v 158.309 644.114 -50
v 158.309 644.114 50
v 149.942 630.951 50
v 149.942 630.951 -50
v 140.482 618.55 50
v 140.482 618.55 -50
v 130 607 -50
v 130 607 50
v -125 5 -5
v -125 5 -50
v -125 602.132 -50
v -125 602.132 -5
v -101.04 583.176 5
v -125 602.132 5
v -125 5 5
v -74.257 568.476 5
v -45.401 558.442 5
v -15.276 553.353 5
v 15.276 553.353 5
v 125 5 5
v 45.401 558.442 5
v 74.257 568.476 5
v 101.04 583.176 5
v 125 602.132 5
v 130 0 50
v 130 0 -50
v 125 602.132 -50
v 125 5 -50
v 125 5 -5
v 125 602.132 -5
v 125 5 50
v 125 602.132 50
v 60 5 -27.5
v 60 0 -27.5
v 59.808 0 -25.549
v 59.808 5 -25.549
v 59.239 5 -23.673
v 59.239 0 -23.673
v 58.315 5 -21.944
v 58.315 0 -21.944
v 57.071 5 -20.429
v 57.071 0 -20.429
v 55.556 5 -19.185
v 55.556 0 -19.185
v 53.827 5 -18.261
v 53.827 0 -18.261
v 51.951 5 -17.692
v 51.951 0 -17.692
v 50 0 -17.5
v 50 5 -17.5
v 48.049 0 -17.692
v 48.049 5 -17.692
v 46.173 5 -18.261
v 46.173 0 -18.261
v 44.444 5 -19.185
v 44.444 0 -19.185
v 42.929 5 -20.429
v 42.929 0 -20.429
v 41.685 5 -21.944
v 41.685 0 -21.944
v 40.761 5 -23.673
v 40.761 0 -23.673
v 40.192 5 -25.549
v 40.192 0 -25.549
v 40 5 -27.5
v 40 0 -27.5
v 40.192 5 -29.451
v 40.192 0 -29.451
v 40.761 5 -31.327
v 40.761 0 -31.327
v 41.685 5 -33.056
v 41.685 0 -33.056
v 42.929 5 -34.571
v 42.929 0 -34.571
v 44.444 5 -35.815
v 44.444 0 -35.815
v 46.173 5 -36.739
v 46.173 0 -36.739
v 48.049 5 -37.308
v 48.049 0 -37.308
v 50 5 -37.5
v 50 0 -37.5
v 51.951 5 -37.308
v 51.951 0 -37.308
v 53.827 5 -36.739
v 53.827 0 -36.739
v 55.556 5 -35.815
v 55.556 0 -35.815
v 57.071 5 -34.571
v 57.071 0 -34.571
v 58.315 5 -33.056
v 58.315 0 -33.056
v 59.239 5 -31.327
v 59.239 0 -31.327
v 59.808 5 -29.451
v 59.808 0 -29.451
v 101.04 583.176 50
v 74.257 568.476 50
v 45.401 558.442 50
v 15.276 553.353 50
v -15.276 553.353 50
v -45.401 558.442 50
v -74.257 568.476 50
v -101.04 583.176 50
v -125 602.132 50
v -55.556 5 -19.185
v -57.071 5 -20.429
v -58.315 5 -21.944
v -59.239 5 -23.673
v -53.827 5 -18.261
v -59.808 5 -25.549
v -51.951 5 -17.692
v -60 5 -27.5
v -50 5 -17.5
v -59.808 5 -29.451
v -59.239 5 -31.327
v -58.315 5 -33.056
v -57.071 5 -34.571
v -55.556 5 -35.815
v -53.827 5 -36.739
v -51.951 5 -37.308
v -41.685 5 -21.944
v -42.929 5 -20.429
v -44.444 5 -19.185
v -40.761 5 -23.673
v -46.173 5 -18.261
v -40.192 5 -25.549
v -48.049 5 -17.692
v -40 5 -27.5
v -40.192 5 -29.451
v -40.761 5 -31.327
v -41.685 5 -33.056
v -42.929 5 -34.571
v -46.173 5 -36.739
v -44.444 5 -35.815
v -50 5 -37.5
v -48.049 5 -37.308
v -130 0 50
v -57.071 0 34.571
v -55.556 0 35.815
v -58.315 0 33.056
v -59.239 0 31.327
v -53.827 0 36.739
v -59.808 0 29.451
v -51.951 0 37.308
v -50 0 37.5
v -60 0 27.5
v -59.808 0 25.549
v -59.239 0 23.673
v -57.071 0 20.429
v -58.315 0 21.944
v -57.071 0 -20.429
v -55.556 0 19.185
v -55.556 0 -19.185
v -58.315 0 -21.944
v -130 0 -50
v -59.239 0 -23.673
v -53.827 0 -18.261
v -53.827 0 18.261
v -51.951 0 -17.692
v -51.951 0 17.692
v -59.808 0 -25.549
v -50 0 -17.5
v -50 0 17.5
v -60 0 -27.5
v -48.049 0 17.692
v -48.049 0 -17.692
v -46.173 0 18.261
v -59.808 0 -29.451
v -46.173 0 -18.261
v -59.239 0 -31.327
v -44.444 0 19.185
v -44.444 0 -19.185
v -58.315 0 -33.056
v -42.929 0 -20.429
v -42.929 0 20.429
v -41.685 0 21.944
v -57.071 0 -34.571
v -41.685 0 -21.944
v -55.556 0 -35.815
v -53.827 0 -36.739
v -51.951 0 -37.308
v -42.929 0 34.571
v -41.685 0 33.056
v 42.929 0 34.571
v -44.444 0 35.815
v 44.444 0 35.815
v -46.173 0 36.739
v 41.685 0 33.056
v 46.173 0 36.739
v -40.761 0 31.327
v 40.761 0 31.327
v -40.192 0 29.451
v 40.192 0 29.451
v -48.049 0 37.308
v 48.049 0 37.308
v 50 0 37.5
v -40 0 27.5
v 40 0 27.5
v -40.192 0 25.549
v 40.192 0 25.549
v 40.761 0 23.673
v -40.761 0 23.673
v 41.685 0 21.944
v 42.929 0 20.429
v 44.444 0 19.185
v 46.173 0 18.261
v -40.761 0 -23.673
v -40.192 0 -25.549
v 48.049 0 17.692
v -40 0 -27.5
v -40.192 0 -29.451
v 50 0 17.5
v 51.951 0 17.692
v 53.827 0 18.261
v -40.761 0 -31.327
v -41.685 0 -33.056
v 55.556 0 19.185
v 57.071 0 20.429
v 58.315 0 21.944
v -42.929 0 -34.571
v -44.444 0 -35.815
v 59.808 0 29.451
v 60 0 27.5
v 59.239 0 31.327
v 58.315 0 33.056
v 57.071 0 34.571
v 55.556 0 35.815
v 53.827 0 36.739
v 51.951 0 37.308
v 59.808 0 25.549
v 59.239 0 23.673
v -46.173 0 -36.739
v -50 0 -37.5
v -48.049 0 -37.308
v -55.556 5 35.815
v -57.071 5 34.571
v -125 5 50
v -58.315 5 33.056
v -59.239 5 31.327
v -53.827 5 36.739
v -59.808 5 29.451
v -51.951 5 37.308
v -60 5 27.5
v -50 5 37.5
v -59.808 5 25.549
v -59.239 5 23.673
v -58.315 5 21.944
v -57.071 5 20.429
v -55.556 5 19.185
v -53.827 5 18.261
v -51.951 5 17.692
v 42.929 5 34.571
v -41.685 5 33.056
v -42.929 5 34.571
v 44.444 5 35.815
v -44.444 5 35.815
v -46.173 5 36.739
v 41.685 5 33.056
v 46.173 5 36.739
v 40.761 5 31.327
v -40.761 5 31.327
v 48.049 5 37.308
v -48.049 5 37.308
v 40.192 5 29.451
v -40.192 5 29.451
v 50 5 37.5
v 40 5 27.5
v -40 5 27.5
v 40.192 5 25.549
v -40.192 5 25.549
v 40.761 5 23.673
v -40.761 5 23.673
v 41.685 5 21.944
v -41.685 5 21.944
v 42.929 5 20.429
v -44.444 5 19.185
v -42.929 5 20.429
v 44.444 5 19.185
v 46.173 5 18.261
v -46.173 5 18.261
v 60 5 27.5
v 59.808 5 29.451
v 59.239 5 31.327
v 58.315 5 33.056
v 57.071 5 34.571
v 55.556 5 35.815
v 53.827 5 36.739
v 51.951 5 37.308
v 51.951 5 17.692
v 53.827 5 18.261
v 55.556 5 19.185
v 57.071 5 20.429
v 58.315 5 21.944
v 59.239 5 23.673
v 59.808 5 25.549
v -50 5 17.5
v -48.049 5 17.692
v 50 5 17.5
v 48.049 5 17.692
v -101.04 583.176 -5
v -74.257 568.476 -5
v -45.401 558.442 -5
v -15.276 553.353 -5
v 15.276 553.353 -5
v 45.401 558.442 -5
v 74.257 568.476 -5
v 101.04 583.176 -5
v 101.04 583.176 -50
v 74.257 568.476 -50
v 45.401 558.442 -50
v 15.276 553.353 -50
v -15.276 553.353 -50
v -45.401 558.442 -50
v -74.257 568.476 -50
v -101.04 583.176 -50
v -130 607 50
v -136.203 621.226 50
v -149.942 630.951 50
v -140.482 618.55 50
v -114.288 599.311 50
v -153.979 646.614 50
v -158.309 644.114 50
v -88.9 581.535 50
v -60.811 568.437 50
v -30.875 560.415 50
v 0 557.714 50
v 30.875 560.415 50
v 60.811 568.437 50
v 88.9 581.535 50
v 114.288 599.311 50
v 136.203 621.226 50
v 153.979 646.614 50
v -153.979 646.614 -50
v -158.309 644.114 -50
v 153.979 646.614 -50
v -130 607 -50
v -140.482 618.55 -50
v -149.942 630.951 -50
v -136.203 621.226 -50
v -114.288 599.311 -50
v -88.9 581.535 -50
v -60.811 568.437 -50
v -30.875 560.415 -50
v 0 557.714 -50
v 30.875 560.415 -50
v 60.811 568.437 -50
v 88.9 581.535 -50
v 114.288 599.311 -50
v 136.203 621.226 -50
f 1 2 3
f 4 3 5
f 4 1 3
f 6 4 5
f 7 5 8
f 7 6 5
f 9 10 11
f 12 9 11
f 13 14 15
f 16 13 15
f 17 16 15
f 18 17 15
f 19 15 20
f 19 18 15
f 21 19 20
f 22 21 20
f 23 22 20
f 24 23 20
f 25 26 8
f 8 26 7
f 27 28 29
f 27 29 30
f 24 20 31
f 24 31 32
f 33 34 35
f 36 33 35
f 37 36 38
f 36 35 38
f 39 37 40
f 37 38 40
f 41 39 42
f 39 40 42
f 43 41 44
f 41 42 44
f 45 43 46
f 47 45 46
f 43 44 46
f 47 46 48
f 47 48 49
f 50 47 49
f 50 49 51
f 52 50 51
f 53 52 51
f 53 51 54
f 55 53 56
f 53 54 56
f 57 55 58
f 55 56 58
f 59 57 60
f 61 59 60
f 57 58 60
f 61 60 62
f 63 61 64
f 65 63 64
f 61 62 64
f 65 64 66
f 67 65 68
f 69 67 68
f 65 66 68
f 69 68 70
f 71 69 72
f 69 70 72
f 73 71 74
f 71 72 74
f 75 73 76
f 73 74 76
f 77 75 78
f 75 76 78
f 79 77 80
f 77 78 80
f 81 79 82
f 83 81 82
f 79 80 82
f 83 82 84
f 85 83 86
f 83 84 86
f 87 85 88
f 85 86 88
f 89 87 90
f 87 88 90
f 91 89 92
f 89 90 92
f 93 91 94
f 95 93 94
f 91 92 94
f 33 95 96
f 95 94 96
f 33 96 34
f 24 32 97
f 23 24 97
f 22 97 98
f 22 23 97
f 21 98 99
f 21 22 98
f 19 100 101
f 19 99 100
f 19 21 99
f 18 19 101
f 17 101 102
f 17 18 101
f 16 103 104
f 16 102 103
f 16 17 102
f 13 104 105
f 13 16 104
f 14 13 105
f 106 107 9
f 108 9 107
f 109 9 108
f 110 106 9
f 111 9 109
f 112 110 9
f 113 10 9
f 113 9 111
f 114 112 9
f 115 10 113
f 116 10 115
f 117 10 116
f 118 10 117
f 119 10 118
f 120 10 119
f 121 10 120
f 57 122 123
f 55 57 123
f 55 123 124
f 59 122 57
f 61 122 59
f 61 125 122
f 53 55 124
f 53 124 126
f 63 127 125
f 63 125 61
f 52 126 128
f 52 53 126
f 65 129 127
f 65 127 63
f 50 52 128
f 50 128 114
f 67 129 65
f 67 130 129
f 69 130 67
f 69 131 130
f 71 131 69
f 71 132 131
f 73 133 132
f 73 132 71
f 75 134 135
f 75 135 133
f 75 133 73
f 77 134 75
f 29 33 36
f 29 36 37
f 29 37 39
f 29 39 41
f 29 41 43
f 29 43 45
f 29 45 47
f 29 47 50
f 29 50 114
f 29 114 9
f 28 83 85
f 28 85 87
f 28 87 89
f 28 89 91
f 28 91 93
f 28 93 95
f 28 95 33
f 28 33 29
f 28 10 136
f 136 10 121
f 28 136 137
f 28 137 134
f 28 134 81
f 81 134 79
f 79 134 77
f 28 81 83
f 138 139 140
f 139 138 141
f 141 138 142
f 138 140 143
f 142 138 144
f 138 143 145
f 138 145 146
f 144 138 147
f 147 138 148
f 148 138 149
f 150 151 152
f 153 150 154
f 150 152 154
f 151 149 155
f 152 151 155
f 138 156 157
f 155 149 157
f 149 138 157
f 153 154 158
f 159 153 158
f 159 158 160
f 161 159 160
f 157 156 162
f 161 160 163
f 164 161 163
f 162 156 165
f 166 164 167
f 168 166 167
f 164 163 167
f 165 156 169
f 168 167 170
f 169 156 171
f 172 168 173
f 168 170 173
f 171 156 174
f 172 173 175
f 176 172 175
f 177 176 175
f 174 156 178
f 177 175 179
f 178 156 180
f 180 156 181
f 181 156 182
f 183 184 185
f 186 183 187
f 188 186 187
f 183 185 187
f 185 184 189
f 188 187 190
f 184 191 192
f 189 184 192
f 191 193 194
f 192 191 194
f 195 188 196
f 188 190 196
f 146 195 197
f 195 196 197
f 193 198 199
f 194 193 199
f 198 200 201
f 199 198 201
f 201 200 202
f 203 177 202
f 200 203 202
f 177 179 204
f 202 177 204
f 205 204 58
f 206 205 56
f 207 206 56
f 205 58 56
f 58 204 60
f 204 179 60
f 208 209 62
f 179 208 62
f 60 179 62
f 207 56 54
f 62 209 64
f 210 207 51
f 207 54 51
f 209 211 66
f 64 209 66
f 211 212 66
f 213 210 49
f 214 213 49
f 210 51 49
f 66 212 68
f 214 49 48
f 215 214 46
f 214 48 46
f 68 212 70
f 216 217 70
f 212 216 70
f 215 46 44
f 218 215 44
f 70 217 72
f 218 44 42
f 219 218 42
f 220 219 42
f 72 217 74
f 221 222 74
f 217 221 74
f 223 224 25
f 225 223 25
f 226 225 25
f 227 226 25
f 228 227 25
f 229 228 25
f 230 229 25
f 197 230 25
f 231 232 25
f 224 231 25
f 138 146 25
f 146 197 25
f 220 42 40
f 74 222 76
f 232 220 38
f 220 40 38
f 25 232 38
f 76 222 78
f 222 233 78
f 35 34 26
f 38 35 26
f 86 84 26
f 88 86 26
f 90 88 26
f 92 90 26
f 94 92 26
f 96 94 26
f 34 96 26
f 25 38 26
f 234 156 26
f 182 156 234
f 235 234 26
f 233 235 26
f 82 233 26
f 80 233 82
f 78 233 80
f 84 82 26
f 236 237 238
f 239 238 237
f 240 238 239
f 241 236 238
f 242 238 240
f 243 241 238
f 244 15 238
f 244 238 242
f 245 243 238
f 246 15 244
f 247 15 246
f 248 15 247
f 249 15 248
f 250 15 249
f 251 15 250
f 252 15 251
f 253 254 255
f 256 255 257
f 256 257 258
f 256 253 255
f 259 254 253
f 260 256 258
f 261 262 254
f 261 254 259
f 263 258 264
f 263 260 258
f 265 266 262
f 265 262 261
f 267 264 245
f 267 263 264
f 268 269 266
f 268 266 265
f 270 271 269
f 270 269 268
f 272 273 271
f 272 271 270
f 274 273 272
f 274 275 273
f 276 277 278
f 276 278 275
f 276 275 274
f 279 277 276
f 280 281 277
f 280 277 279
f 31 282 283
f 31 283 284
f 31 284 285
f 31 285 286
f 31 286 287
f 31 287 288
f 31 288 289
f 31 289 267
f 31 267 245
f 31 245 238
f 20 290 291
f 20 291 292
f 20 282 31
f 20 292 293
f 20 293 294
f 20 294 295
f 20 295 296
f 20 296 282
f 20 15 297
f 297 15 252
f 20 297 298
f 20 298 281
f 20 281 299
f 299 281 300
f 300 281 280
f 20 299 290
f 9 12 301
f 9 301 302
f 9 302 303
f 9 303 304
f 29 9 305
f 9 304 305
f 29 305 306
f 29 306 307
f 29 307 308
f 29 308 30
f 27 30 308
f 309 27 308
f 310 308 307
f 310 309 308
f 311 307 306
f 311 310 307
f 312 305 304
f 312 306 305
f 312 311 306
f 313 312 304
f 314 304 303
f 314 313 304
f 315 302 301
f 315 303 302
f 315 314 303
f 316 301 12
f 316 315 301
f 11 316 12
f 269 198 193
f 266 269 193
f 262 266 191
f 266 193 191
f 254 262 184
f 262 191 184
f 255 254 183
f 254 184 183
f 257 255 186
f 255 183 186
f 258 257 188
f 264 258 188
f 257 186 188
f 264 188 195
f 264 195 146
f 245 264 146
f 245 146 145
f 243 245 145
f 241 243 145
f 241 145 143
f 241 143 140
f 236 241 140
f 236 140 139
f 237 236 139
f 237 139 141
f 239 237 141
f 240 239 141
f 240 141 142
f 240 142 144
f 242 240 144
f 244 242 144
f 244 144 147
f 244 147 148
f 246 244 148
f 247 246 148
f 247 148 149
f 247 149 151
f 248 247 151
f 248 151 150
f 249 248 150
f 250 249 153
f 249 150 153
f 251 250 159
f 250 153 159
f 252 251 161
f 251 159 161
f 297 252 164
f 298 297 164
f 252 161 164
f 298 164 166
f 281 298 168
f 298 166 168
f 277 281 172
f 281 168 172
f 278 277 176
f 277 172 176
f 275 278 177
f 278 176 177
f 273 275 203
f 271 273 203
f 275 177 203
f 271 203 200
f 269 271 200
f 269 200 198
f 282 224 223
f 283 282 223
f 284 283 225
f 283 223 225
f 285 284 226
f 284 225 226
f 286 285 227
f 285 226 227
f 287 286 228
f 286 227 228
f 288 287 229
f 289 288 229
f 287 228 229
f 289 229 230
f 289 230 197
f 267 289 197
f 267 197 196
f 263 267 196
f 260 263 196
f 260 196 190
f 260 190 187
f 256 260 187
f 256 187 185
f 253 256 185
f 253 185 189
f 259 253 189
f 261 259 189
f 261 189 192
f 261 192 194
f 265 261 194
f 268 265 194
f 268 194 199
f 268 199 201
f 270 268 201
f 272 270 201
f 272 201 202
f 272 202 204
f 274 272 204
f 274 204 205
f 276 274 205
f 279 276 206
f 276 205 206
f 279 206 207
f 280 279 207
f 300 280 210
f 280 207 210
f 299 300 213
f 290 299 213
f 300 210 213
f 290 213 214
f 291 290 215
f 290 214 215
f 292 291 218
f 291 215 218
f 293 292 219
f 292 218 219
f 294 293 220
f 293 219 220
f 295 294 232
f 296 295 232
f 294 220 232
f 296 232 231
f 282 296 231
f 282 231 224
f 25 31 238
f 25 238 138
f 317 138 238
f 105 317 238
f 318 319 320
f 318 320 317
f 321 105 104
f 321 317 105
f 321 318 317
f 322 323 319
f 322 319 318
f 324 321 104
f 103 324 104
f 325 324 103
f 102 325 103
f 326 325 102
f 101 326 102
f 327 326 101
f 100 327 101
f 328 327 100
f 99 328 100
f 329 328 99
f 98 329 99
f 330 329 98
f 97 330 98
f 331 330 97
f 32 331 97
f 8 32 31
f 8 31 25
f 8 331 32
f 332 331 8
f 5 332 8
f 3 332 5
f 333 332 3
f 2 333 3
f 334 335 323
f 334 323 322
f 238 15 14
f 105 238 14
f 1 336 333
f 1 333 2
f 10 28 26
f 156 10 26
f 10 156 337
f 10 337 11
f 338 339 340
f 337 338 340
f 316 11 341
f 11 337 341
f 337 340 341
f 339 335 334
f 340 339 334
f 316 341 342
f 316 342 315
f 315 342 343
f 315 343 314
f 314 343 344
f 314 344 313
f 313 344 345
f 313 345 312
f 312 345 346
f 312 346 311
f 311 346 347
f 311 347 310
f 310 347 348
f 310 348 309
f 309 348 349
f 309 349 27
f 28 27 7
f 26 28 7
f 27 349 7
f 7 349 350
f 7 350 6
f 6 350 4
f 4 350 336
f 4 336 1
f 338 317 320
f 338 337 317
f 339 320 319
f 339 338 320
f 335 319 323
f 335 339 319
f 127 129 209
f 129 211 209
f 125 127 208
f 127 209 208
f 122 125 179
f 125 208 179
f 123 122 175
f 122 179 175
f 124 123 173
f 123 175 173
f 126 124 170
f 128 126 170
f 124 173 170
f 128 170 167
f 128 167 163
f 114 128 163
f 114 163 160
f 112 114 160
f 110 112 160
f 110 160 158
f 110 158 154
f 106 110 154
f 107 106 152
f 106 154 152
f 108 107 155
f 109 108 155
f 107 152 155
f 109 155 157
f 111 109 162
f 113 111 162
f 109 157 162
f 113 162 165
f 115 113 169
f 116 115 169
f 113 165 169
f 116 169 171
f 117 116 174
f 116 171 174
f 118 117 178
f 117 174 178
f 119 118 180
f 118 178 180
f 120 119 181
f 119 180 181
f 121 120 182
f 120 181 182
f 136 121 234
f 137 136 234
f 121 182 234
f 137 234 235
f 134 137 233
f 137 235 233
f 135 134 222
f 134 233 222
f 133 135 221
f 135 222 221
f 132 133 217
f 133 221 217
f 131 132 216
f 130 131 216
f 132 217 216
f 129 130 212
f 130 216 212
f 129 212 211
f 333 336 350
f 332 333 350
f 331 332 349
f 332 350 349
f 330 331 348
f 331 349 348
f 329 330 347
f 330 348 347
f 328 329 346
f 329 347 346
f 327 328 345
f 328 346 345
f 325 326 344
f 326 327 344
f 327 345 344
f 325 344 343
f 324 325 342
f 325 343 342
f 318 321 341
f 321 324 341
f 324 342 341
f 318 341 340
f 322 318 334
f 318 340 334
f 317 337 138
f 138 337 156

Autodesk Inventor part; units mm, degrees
ref_plane "YZ Plane" through (0, 0, 0) normal (1, 0, 0) x (0, 1, 0)
ref_plane "XZ Plane" through (0, 0, 0) normal (0, 1, 0) x (-1, 0, 0)
ref_plane "XY Plane" through (0, 0, 0) normal (0, 0, 1) x (1, 0, 0)
sketch "Sketch1" plane through (0, 0, 0) normal (0, 0, 1) x (1, 0, 0)
  line L0 (-130, 607) -> (-130, 0)
  line L1 (-130, 0) -> (130, 0)
  line L2 (130, 0) -> (130, 607)
  line L3 (125, 5) -> (125, 602.1317)
  line L4 (-125, 5) -> (-125, 602.1317)
  line L5 (-125, 5) -> (125, 5)
  arc A0 (-153.9793, 646.614) -> (153.9793, 646.614) centre (0, 735.514) ccw
  arc A1 (130, 607) -> (158.3094, 644.114) centre (0, 735.514) ccw
  arc A2 (-158.3094, 644.114) -> (-130, 607) centre (0, 735.514) ccw
  arc A3 (-125, 602.1317) -> (125, 602.1317) centre (0, 735.514) ccw
  line L6 (-158.3094, 644.114) -> (-153.9793, 646.614)
  line L7 (153.9793, 646.614) -> (158.3094, 644.114)
  point P0 (0, 0)
  point P1 (0, 0)
  point P2 (0, 5)
  dimension "d0" = 260
  dimension "d2" = 607
  dimension "d3" = 607
  dimension "d6" = 5
  dimension "d7" = 5
  dimension "d8" = 5
  dimension "d57" = 355.6
  dimension "d61" = 5
  dimension "d64" = 182.8
  dimension "d79" = 130
  dimension "d80" = 120
  dimension "d81" = 158.3094
  dimension "d82" = 153.9793
  dimension "d83" = 153.9793
extrude "Extrusion1" add sketch "Sketch1" along normal mid plane 100
sketch "Sketch5" plane through (0, 0, 0) normal (0, 0, 1) x (1, 0, 0)
  line L0 (-125, 602.1317) -> (-125, 5) projected
  line L1 (-125, 602.1317) -> (-125, 5)
  line L2 (-125, 5) -> (125, 5)
  line L3 (-125, 5) -> (125, 5) projected
  line L4 (125, 5) -> (125, 602.1317) projected
  line L5 (125, 5) -> (125, 602.1317)
  arc A0 (-125, 602.1317) -> (125, 602.1317) centre (0, 735.514) ccw
  point P0 (0, 0)
  point P1 (0, 5)
  dimension "d67" = 365.6
extrude "Extrusion2" add sketch "Sketch5" along normal mid plane 10
sketch "Sketch6" plane through (-130, 0, 50) normal (0, -1, 0) x (1, 0, 0)
  line L0 (5, -100) -> (255, -100) projected
  line L1 (130, -100) -> (130, 0)
  line L2 (0, 0) -> (260, 0) projected
  circle A0 centre (180, -77.5) radius 10
  circle A1 centre (180, -22.5) radius 10
  circle A2 centre (80, -77.5) radius 10
  circle A3 centre (80, -22.5) radius 10
  point P0 (130, -50)
  dimension "d72" = 20
  dimension "d73" = 100
  dimension "d74" = 20
  dimension "d75" = 55
  dimension "d76" = 100
  dimension "d84" = 22.5
extrude "Extrusion5" cut sketch "Sketch6" against normal blind 10
properties part number "Fix Saddle Pervecto" material "Steel ASTM A36"
